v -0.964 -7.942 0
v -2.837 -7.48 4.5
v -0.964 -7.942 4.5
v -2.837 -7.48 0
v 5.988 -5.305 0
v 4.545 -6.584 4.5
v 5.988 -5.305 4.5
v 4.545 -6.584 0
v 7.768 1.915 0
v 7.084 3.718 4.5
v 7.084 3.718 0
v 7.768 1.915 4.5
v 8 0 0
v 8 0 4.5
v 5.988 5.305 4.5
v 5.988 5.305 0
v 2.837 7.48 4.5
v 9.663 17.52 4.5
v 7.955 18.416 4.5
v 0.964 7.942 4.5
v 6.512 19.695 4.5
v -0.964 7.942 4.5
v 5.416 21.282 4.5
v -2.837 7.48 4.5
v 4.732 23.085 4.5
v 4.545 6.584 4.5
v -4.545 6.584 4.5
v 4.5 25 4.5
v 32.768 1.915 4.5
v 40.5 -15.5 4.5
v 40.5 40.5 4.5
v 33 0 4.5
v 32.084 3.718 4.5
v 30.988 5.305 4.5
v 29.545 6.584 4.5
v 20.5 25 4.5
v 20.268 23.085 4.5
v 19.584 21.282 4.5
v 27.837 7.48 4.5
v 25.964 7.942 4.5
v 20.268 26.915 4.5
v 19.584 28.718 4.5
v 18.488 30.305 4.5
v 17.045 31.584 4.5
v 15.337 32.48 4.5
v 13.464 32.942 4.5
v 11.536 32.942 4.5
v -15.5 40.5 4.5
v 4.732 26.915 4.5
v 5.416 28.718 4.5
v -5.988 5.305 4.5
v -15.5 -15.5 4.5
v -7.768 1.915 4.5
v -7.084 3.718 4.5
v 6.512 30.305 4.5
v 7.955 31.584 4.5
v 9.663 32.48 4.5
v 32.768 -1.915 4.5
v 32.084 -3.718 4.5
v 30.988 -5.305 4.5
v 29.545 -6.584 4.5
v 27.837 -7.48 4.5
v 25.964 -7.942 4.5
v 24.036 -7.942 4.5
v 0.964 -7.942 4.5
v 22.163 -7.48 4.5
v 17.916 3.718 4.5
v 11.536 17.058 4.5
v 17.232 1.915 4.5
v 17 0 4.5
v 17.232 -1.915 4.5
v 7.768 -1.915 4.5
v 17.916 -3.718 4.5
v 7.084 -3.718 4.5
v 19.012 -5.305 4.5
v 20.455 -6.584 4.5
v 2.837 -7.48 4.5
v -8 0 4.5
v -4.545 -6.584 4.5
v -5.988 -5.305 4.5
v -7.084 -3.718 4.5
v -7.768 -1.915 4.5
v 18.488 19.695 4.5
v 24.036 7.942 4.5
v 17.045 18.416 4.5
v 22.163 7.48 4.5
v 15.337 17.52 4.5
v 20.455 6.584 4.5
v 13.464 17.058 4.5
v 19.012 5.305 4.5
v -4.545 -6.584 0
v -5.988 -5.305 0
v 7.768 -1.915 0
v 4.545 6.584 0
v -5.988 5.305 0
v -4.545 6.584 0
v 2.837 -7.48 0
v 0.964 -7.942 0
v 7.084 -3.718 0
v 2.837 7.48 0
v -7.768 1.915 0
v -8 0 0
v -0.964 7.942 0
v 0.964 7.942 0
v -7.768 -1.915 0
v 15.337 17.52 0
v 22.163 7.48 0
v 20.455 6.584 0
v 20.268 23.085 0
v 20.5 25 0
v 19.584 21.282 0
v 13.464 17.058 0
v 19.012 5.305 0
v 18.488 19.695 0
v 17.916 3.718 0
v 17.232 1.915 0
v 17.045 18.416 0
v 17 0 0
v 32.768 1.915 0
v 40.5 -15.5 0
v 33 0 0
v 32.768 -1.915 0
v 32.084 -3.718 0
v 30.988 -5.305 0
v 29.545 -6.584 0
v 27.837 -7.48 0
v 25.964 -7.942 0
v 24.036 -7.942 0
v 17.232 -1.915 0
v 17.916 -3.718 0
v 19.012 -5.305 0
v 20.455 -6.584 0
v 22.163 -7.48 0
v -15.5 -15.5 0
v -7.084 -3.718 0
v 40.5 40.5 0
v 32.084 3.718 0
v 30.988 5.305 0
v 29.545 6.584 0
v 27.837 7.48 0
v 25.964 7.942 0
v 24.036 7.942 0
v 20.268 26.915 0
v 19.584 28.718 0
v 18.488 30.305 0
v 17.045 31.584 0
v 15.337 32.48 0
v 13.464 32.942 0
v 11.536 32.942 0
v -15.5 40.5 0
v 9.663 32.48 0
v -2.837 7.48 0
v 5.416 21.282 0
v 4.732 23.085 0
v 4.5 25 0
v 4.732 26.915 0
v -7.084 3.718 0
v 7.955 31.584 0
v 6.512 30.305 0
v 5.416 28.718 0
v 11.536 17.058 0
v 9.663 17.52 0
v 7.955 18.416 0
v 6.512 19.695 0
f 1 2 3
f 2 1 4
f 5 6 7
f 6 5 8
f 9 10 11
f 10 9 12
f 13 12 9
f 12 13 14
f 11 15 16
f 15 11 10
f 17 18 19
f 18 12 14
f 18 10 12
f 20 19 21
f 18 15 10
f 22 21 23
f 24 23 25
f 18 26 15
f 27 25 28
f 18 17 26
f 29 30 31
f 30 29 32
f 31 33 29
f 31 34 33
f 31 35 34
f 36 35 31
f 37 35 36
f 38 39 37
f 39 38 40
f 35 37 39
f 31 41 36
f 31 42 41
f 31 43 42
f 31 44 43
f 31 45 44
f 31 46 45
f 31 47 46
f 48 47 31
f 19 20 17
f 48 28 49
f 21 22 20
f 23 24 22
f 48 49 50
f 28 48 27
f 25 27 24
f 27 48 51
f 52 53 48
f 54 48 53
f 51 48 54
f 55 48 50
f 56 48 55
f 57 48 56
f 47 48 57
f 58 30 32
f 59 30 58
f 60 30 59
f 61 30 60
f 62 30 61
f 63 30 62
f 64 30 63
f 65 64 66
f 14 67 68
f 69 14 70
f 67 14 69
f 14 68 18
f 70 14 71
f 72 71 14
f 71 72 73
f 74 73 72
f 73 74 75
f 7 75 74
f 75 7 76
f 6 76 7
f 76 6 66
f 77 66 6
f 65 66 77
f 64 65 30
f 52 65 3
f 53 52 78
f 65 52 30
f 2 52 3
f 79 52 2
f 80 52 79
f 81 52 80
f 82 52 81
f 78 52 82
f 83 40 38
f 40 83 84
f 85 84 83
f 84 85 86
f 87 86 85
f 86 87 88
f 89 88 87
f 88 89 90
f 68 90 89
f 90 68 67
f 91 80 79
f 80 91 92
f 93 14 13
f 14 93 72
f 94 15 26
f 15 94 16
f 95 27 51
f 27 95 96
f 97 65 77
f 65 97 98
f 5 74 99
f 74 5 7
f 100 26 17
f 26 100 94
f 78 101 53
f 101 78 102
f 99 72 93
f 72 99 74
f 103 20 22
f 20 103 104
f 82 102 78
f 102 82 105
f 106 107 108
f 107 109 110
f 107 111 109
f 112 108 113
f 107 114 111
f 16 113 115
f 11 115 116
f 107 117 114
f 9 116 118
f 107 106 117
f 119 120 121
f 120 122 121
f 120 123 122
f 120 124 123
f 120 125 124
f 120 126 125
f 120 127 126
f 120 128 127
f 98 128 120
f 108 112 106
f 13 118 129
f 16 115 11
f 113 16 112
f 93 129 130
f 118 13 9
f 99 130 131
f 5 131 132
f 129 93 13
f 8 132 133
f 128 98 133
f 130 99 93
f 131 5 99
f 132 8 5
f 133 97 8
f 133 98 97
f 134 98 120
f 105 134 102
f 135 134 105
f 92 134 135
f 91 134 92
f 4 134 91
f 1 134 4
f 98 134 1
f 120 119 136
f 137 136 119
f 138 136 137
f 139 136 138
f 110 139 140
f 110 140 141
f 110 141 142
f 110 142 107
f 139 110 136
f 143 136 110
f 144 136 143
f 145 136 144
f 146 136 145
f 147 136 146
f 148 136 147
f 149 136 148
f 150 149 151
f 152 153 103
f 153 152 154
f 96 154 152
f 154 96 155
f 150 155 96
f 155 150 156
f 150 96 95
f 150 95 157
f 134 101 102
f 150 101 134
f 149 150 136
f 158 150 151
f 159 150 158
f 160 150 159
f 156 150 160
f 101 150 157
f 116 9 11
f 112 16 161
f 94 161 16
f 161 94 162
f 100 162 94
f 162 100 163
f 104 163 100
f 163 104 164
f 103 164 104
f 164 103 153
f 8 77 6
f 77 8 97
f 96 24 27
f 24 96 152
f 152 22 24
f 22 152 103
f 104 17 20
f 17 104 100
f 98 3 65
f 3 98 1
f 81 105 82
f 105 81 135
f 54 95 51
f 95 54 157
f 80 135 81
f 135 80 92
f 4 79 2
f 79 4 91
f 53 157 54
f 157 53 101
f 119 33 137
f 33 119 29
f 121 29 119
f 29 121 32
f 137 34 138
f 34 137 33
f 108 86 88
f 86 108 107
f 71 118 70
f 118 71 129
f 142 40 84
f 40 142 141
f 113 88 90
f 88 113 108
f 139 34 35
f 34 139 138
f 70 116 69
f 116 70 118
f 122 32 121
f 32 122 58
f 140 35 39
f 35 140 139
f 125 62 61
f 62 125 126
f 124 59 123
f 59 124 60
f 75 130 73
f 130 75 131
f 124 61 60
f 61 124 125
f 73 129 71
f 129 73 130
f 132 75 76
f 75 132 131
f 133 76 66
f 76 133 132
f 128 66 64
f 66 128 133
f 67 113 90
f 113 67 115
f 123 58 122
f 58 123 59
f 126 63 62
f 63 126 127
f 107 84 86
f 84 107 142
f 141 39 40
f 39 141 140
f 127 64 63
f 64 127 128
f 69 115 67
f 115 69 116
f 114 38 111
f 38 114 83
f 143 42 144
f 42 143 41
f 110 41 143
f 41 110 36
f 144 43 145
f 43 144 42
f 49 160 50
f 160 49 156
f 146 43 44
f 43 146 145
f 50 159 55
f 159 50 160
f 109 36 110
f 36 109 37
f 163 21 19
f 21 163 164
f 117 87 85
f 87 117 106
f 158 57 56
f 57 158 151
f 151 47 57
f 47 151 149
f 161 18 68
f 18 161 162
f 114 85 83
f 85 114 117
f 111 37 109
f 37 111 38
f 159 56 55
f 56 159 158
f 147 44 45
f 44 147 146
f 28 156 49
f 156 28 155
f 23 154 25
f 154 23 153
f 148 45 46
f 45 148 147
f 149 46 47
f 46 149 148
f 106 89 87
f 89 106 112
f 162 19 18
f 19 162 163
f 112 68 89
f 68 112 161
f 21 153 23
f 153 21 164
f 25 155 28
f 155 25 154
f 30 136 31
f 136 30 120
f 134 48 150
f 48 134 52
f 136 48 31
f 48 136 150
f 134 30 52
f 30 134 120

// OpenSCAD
/*
 * This is the back mounting plate for Dead Bolt opener along with a bracket to mount
 * a servo motor
*/
// Back Plate variables
plate_width = 107;
plate_height = 100;
plate_thickness = 4.5;
groove_diameter = 20;
groove_width_backplate = 60;
groove_width_offset = 0;
groove_position = 40;

// Back plate slot settings
slot_diameter = 3.25;
slot_length = 40;
slot_spacing = 10;
slot_width_offset = plate_width/2 - 15;
slot_height_offset = -15;

// Trap slot settings
trap_diameter = slot_diameter + 3;
trap_length = slot_length;
trap_spacing = slot_spacing;
trap_width_offset = slot_width_offset;
trap_height_offset = slot_height_offset;
trap_depth = plate_thickness - 1.5;

// Servo Bracket settings
bracket_height = 30; // The overall height of the bracket.
bracket_reach = 25;  // Adjust the top tab of the bracket to reach out farther
bracket_base_length = 20; // Makes the base of bracket longer, and the slots longer
bracket_width = 30;	// Makes the overall width of the bracket bigger. Wider = stronger
bracket_thickness = 4; // changes the cross section thickness of the bracket
bracket_base_slot_length = bracket_base_length / 2;
bracket_reach_slot_length = bracket_reach / 2;
servo_hole_diameter = 3.5;
servo_hole_spacing = 15;
servo_hole_offset = -8; // More negative number backs the holes away from the edge

// Servo coupling
// For
//	   single servo arm  = 0
//     Large Servo Horns = 1
// 	   X Horns           = 2
// 	   wheel             = 3
horn_type = 1;
coupling_width = 16;
coupling_depth = 18;
coupling_length = 45;
coupling_wall_thickness = 1.5;
servo_couple_offset = 5;
servo_couple_radius = (coupling_width - coupling_wall_thickness)/2;
groove_width = 2;
servo_arm_groove_width = 3;
servo_arm_recess_depth = 1.5;
servo_arm_recess_width = 2;

//Button Panel
button_hole_diameter = 16;
button_spacing = 25;
panel_padding = 15;			// Padding (extra meat around panel edges)

/*
* Still needs to be implemented
*/
module servoHorn(horn_type){
	if(horn_type == 0){ // Large Horns
		circle(r = 5);
	}
}

/*
 * Coupling for thumb knob
 *
 */
module deadBoltCoupler(coupling_width, coupling_depth, coupling_length, coupling_wall_thickness){
	difference(){ // Cutout recess for servo arm
		difference(){ // Cutout holes to zip tie the servo to this thing 
			difference(){// Cut away grooves for coupling thing
				difference(){ // Cut outs at bottom to clear thumbwheel 
					union(){ // Create the major box of the coupling
						for(x = [0, coupling_width]){ // Iterate to create two  long side walls
							translate([x, 0, 0])
							cube(size = [coupling_wall_thickness, coupling_length, coupling_depth]);
						}
						// Short side walls perpendicular to long walls
						cube(size = [coupling_width, coupling_wall_thickness, coupling_depth]);
						translate([0, coupling_length - coupling_wall_thickness, 0])
						cube(size = [coupling_width, coupling_wall_thickness, coupling_depth]);
						hull(){ // To create pretty top 
							translate([0,0,coupling_depth]) // Move cube to the top of the coupling
															// To be the other half of the hull
							cube(size = [coupling_width + coupling_wall_thickness, coupling_length, coupling_wall_thickness]);
							// Center the cylinder above coupling for the hull
							translate([(coupling_width - coupling_wall_thickness)/2 + coupling_wall_thickness, coupling_length/2, coupling_depth + coupling_wall_thickness + servo_couple_offset])
							cylinder(r = coupling_width/3, h = coupling_wall_thickness);
						}
					}
					translate([(coupling_width - coupling_wall_thickness)/2 + coupling_wall_thickness, 0,0])
					rotate([-90, 0, 0])
					cylinder(r = servo_couple_radius , h = coupling_length + 1);
				}
				// This is very ugly...
				for(i = [ [0, (coupling_length/16)    ,0],
						  [0, coupling_length/4       ,0],
						  [0, 3*(coupling_length/4) - groove_width   ,0],
						  [0, 15*(coupling_length/16) - groove_width ,0],
						  // Top
						  [0, (coupling_length/16)    ,(coupling_depth + coupling_wall_thickness/1.125) + (servo_couple_offset/(coupling_length/2 - servo_couple_radius))*coupling_length/16],
						  [0, coupling_length/4       ,(coupling_depth + coupling_wall_thickness/1.125) + (servo_couple_offset/(coupling_length/2 - servo_couple_radius))*coupling_length/4],
						  [0, 3*(coupling_length/4) - groove_width   ,(coupling_depth + coupling_wall_thickness/1.125) + (servo_couple_offset/(coupling_length/2 - servo_couple_radius))*coupling_length/4],
						  [0, 15*(coupling_length/16) - groove_width ,(coupling_depth + coupling_wall_thickness/1.125) + (servo_couple_offset/(coupling_length/2 - servo_couple_radius))*coupling_length/16]]){
					translate(i)
					cube(size = [coupling_width + coupling_wall_thickness, groove_width, 2]);
				}
			}
			translate([0, 2*(coupling_length/4) - groove_width ,(coupling_depth + coupling_wall_thickness/1.125) + (servo_couple_offset/(coupling_length/2 - servo_couple_radius))*coupling_length/4])
			cube(size = [coupling_width + coupling_wall_thickness, groove_width*2, 1]);
		}
		translate([(coupling_width - coupling_wall_thickness)/2 + coupling_wall_thickness, coupling_length/2, coupling_depth + coupling_wall_thickness + servo_couple_offset + servo_arm_recess_depth/2])
		for(x = [0 : 3]){
			rotate(a = [0, 0, 90 * x])
			#cube(size = [servo_couple_radius + 10, servo_arm_groove_width, servo_arm_recess_depth], center = true);
		}
	}
}

module backplate(){
	difference(){
		// Set up the basic back plate
		union(){
			cube(size = [plate_width, plate_height, plate_thickness]);
			// Move to cylinders to round the top and bottom (make it pretty)
			translate([plate_width/2, 0,0])
			cylinder(r = plate_width/2, h = plate_thickness, center= false);
			translate([plate_width/2, plate_height,0])
			cylinder(r = plate_width/2, h = plate_thickness, center= false);
		}
		translate([groove_width_offset,groove_position, 0]){
				union(){// Groove
					#cube(size = [groove_width_backplate, groove_diameter, plate_thickness]);
					translate([groove_width_backplate,groove_diameter/2,0])
					cylinder(r = groove_diameter/2, h = plate_thickness, center= false);
					translate([0,groove_diameter/2,0])
					cylinder(r = groove_diameter/2, h = plate_thickness, center= false);
				}
		}
	}
}

/*
*	Utility module for creating slots
*/
module slots(slot_diameter, slot_length, slot_spacing, plate_thickness){
echo (slot_length);
	for(x = [(-slot_spacing/2), (slot_spacing/2)]){
		echo (x);
		translate([x, 0, 0]){
			union(){
				#cube([slot_diameter, slot_length, plate_thickness]);
				translate([slot_diameter/2, slot_length,0])
				cylinder(r = slot_diameter/2, h = plate_thickness);
				translate([slot_diameter/2, 0,0])
				cylinder(r = slot_diameter/2, h = plate_thickness);
			}
		}
	}
}

/*
* 	Bracket for mounting servo to backplate
*/
module servoBracket(){
difference(){
	difference(){ // Difference for base slots
		union(){ // Create the general bracket
			// Bracket Base
			cube([bracket_base_length, bracket_thickness, bracket_width]);
			translate([bracket_base_length,0,0])
			// Bracket stem
			cube([bracket_thickness, bracket_height - (2*bracket_thickness), bracket_width]);
			translate([bracket_base_length, bracket_height - (2*bracket_thickness),0])
			cube([bracket_reach, bracket_thickness, bracket_width]);
		}
		rotate(a = [90,90,0]){ // Place and rotate the lower slots
			// For some reason I needed to add one...
			translate([-bracket_width/2 - slot_spacing/2 + slot_diameter - 1, bracket_base_length/3, -bracket_thickness-.1]){
				#slots(slot_diameter, bracket_base_slot_length, slot_spacing,bracket_thickness+1);
			}
		}
	}
	rotate(a = 90, v =[1,0,0] ){
		for(y = [-servo_hole_spacing/2, servo_hole_spacing/2]){
			translate([bracket_base_length + bracket_thickness + bracket_reach + servo_hole_offset, y + bracket_width/2,-bracket_height + bracket_thickness])
			#cylinder(r = servo_hole_diameter/2, h = bracket_thickness + .1);
		}
	}
}
}

/*
* This is a 3 button button panel for these fancy momentary switches from adafruit
* 
**/
module buttonPanel(){
		difference(){
				translate([-button_hole_diameter/2 - panel_padding/2, -button_hole_diameter/2 - panel_padding/2 ,0])
					cube([button_hole_diameter + button_spacing + panel_padding, button_hole_diameter + button_spacing + panel_padding,plate_thickness]);
				union(){
					cylinder(r=button_hole_diameter/2, h = plate_thickness);
					translate([button_spacing, 0, 0])
						cylinder(r=button_hole_diameter/2, h = plate_thickness);
					translate([button_spacing/2, button_spacing, 0])
						cylinder(r=button_hole_diameter/2, h = plate_thickness);
				}
	}
		
}

//////////////////////////////////////////////
// Place and instantiate modules for printing
// Change the translate values or comment out
// the module calls to move or remove parts for
// printing
///////////////////////////////////////////////
/*
difference(){ // Create groove/trap behind plate so it will sit flush against door
			  // when there is fasteners through the plate
	difference(){ // subtract slots from backplate
		backplate();
		translate([slot_width_offset, slot_height_offset, 0])
		#slots(slot_diameter, slot_length, slot_spacing, plate_thickness);
	}
	translate([slot_width_offset + (slot_diameter/2 - trap_diameter/2) ,slot_height_offset ,0])
	#slots(trap_diameter, trap_length, trap_spacing, trap_depth);
}
// Move rotate the servo bracket
translate([-2, 25, 0])
rotate(a = [0,0,90])
servoBracket();
// Move and rotate coupling
translate([50, 41.5,0])
rotate(a = [0, 0, 90])
deadBoltCoupler(coupling_width, coupling_depth, coupling_length, coupling_wall_thickness);*/
buttonPanel();

	
	
	
	
	
	
	
	
	
